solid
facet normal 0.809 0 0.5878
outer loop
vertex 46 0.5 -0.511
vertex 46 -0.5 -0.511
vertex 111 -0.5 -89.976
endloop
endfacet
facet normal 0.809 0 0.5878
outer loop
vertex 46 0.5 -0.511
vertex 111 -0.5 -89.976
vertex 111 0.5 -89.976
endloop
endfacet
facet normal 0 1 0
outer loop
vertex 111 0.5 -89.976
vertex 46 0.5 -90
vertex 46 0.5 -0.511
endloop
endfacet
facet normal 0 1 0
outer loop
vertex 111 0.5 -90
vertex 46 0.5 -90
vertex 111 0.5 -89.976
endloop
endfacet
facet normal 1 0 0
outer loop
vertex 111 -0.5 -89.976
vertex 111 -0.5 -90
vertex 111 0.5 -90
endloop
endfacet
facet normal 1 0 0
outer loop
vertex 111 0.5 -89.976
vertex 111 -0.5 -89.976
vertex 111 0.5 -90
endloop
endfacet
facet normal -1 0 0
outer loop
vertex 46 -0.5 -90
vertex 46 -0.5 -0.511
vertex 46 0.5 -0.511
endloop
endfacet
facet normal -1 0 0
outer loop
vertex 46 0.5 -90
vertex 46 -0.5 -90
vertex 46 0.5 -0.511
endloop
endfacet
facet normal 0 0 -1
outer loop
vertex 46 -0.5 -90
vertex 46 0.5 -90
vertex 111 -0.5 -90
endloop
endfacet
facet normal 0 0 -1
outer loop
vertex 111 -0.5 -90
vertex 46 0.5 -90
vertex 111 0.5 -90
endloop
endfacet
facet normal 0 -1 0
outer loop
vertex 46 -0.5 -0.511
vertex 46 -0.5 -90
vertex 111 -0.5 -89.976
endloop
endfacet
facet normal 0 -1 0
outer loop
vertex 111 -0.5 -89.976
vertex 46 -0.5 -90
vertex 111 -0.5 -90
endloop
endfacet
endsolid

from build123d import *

# Parameters (mm, degrees)
BOX010_W               = 65
BOX010_H               = 1
BOX010_DEPTH           = 121
BOX010_PLACEMENT_ANGLE = 324
BOX_W                  = 65
BOX_H                  = 1
BOX_DEPTH              = 90


with BuildPart() as cubo010:
    # Box010 → Box010 (new body)
    with BuildSketch(Plane.XY):
        with Locations((32.5, 0.5)):
            Rectangle(BOX010_W, BOX010_H)
    extrude(amount=BOX010_DEPTH)


with BuildPart() as cubo010_1:
    # Box010 placement: moved
    add(cubo010.part.moved(Location((114.65, -0.5, -95))).rotate(Axis((114.65, -0.5, -95), (0, 1, 0)), BOX010_PLACEMENT_ANGLE))


with BuildPart() as aleta:
    # Box → Box (new body)
    with BuildSketch(Plane(origin=(46, -0.5, -90), x_dir=(1, 0, 0), z_dir=(0, 0, 1))):
        with Locations((32.5, 0.5)):
            Rectangle(BOX_W, BOX_H)
    extrude(amount=BOX_DEPTH)

    # Cut002: cut Cubo010
    add(cubo010_1.part, mode=Mode.SUBTRACT)


solid = aleta.part
